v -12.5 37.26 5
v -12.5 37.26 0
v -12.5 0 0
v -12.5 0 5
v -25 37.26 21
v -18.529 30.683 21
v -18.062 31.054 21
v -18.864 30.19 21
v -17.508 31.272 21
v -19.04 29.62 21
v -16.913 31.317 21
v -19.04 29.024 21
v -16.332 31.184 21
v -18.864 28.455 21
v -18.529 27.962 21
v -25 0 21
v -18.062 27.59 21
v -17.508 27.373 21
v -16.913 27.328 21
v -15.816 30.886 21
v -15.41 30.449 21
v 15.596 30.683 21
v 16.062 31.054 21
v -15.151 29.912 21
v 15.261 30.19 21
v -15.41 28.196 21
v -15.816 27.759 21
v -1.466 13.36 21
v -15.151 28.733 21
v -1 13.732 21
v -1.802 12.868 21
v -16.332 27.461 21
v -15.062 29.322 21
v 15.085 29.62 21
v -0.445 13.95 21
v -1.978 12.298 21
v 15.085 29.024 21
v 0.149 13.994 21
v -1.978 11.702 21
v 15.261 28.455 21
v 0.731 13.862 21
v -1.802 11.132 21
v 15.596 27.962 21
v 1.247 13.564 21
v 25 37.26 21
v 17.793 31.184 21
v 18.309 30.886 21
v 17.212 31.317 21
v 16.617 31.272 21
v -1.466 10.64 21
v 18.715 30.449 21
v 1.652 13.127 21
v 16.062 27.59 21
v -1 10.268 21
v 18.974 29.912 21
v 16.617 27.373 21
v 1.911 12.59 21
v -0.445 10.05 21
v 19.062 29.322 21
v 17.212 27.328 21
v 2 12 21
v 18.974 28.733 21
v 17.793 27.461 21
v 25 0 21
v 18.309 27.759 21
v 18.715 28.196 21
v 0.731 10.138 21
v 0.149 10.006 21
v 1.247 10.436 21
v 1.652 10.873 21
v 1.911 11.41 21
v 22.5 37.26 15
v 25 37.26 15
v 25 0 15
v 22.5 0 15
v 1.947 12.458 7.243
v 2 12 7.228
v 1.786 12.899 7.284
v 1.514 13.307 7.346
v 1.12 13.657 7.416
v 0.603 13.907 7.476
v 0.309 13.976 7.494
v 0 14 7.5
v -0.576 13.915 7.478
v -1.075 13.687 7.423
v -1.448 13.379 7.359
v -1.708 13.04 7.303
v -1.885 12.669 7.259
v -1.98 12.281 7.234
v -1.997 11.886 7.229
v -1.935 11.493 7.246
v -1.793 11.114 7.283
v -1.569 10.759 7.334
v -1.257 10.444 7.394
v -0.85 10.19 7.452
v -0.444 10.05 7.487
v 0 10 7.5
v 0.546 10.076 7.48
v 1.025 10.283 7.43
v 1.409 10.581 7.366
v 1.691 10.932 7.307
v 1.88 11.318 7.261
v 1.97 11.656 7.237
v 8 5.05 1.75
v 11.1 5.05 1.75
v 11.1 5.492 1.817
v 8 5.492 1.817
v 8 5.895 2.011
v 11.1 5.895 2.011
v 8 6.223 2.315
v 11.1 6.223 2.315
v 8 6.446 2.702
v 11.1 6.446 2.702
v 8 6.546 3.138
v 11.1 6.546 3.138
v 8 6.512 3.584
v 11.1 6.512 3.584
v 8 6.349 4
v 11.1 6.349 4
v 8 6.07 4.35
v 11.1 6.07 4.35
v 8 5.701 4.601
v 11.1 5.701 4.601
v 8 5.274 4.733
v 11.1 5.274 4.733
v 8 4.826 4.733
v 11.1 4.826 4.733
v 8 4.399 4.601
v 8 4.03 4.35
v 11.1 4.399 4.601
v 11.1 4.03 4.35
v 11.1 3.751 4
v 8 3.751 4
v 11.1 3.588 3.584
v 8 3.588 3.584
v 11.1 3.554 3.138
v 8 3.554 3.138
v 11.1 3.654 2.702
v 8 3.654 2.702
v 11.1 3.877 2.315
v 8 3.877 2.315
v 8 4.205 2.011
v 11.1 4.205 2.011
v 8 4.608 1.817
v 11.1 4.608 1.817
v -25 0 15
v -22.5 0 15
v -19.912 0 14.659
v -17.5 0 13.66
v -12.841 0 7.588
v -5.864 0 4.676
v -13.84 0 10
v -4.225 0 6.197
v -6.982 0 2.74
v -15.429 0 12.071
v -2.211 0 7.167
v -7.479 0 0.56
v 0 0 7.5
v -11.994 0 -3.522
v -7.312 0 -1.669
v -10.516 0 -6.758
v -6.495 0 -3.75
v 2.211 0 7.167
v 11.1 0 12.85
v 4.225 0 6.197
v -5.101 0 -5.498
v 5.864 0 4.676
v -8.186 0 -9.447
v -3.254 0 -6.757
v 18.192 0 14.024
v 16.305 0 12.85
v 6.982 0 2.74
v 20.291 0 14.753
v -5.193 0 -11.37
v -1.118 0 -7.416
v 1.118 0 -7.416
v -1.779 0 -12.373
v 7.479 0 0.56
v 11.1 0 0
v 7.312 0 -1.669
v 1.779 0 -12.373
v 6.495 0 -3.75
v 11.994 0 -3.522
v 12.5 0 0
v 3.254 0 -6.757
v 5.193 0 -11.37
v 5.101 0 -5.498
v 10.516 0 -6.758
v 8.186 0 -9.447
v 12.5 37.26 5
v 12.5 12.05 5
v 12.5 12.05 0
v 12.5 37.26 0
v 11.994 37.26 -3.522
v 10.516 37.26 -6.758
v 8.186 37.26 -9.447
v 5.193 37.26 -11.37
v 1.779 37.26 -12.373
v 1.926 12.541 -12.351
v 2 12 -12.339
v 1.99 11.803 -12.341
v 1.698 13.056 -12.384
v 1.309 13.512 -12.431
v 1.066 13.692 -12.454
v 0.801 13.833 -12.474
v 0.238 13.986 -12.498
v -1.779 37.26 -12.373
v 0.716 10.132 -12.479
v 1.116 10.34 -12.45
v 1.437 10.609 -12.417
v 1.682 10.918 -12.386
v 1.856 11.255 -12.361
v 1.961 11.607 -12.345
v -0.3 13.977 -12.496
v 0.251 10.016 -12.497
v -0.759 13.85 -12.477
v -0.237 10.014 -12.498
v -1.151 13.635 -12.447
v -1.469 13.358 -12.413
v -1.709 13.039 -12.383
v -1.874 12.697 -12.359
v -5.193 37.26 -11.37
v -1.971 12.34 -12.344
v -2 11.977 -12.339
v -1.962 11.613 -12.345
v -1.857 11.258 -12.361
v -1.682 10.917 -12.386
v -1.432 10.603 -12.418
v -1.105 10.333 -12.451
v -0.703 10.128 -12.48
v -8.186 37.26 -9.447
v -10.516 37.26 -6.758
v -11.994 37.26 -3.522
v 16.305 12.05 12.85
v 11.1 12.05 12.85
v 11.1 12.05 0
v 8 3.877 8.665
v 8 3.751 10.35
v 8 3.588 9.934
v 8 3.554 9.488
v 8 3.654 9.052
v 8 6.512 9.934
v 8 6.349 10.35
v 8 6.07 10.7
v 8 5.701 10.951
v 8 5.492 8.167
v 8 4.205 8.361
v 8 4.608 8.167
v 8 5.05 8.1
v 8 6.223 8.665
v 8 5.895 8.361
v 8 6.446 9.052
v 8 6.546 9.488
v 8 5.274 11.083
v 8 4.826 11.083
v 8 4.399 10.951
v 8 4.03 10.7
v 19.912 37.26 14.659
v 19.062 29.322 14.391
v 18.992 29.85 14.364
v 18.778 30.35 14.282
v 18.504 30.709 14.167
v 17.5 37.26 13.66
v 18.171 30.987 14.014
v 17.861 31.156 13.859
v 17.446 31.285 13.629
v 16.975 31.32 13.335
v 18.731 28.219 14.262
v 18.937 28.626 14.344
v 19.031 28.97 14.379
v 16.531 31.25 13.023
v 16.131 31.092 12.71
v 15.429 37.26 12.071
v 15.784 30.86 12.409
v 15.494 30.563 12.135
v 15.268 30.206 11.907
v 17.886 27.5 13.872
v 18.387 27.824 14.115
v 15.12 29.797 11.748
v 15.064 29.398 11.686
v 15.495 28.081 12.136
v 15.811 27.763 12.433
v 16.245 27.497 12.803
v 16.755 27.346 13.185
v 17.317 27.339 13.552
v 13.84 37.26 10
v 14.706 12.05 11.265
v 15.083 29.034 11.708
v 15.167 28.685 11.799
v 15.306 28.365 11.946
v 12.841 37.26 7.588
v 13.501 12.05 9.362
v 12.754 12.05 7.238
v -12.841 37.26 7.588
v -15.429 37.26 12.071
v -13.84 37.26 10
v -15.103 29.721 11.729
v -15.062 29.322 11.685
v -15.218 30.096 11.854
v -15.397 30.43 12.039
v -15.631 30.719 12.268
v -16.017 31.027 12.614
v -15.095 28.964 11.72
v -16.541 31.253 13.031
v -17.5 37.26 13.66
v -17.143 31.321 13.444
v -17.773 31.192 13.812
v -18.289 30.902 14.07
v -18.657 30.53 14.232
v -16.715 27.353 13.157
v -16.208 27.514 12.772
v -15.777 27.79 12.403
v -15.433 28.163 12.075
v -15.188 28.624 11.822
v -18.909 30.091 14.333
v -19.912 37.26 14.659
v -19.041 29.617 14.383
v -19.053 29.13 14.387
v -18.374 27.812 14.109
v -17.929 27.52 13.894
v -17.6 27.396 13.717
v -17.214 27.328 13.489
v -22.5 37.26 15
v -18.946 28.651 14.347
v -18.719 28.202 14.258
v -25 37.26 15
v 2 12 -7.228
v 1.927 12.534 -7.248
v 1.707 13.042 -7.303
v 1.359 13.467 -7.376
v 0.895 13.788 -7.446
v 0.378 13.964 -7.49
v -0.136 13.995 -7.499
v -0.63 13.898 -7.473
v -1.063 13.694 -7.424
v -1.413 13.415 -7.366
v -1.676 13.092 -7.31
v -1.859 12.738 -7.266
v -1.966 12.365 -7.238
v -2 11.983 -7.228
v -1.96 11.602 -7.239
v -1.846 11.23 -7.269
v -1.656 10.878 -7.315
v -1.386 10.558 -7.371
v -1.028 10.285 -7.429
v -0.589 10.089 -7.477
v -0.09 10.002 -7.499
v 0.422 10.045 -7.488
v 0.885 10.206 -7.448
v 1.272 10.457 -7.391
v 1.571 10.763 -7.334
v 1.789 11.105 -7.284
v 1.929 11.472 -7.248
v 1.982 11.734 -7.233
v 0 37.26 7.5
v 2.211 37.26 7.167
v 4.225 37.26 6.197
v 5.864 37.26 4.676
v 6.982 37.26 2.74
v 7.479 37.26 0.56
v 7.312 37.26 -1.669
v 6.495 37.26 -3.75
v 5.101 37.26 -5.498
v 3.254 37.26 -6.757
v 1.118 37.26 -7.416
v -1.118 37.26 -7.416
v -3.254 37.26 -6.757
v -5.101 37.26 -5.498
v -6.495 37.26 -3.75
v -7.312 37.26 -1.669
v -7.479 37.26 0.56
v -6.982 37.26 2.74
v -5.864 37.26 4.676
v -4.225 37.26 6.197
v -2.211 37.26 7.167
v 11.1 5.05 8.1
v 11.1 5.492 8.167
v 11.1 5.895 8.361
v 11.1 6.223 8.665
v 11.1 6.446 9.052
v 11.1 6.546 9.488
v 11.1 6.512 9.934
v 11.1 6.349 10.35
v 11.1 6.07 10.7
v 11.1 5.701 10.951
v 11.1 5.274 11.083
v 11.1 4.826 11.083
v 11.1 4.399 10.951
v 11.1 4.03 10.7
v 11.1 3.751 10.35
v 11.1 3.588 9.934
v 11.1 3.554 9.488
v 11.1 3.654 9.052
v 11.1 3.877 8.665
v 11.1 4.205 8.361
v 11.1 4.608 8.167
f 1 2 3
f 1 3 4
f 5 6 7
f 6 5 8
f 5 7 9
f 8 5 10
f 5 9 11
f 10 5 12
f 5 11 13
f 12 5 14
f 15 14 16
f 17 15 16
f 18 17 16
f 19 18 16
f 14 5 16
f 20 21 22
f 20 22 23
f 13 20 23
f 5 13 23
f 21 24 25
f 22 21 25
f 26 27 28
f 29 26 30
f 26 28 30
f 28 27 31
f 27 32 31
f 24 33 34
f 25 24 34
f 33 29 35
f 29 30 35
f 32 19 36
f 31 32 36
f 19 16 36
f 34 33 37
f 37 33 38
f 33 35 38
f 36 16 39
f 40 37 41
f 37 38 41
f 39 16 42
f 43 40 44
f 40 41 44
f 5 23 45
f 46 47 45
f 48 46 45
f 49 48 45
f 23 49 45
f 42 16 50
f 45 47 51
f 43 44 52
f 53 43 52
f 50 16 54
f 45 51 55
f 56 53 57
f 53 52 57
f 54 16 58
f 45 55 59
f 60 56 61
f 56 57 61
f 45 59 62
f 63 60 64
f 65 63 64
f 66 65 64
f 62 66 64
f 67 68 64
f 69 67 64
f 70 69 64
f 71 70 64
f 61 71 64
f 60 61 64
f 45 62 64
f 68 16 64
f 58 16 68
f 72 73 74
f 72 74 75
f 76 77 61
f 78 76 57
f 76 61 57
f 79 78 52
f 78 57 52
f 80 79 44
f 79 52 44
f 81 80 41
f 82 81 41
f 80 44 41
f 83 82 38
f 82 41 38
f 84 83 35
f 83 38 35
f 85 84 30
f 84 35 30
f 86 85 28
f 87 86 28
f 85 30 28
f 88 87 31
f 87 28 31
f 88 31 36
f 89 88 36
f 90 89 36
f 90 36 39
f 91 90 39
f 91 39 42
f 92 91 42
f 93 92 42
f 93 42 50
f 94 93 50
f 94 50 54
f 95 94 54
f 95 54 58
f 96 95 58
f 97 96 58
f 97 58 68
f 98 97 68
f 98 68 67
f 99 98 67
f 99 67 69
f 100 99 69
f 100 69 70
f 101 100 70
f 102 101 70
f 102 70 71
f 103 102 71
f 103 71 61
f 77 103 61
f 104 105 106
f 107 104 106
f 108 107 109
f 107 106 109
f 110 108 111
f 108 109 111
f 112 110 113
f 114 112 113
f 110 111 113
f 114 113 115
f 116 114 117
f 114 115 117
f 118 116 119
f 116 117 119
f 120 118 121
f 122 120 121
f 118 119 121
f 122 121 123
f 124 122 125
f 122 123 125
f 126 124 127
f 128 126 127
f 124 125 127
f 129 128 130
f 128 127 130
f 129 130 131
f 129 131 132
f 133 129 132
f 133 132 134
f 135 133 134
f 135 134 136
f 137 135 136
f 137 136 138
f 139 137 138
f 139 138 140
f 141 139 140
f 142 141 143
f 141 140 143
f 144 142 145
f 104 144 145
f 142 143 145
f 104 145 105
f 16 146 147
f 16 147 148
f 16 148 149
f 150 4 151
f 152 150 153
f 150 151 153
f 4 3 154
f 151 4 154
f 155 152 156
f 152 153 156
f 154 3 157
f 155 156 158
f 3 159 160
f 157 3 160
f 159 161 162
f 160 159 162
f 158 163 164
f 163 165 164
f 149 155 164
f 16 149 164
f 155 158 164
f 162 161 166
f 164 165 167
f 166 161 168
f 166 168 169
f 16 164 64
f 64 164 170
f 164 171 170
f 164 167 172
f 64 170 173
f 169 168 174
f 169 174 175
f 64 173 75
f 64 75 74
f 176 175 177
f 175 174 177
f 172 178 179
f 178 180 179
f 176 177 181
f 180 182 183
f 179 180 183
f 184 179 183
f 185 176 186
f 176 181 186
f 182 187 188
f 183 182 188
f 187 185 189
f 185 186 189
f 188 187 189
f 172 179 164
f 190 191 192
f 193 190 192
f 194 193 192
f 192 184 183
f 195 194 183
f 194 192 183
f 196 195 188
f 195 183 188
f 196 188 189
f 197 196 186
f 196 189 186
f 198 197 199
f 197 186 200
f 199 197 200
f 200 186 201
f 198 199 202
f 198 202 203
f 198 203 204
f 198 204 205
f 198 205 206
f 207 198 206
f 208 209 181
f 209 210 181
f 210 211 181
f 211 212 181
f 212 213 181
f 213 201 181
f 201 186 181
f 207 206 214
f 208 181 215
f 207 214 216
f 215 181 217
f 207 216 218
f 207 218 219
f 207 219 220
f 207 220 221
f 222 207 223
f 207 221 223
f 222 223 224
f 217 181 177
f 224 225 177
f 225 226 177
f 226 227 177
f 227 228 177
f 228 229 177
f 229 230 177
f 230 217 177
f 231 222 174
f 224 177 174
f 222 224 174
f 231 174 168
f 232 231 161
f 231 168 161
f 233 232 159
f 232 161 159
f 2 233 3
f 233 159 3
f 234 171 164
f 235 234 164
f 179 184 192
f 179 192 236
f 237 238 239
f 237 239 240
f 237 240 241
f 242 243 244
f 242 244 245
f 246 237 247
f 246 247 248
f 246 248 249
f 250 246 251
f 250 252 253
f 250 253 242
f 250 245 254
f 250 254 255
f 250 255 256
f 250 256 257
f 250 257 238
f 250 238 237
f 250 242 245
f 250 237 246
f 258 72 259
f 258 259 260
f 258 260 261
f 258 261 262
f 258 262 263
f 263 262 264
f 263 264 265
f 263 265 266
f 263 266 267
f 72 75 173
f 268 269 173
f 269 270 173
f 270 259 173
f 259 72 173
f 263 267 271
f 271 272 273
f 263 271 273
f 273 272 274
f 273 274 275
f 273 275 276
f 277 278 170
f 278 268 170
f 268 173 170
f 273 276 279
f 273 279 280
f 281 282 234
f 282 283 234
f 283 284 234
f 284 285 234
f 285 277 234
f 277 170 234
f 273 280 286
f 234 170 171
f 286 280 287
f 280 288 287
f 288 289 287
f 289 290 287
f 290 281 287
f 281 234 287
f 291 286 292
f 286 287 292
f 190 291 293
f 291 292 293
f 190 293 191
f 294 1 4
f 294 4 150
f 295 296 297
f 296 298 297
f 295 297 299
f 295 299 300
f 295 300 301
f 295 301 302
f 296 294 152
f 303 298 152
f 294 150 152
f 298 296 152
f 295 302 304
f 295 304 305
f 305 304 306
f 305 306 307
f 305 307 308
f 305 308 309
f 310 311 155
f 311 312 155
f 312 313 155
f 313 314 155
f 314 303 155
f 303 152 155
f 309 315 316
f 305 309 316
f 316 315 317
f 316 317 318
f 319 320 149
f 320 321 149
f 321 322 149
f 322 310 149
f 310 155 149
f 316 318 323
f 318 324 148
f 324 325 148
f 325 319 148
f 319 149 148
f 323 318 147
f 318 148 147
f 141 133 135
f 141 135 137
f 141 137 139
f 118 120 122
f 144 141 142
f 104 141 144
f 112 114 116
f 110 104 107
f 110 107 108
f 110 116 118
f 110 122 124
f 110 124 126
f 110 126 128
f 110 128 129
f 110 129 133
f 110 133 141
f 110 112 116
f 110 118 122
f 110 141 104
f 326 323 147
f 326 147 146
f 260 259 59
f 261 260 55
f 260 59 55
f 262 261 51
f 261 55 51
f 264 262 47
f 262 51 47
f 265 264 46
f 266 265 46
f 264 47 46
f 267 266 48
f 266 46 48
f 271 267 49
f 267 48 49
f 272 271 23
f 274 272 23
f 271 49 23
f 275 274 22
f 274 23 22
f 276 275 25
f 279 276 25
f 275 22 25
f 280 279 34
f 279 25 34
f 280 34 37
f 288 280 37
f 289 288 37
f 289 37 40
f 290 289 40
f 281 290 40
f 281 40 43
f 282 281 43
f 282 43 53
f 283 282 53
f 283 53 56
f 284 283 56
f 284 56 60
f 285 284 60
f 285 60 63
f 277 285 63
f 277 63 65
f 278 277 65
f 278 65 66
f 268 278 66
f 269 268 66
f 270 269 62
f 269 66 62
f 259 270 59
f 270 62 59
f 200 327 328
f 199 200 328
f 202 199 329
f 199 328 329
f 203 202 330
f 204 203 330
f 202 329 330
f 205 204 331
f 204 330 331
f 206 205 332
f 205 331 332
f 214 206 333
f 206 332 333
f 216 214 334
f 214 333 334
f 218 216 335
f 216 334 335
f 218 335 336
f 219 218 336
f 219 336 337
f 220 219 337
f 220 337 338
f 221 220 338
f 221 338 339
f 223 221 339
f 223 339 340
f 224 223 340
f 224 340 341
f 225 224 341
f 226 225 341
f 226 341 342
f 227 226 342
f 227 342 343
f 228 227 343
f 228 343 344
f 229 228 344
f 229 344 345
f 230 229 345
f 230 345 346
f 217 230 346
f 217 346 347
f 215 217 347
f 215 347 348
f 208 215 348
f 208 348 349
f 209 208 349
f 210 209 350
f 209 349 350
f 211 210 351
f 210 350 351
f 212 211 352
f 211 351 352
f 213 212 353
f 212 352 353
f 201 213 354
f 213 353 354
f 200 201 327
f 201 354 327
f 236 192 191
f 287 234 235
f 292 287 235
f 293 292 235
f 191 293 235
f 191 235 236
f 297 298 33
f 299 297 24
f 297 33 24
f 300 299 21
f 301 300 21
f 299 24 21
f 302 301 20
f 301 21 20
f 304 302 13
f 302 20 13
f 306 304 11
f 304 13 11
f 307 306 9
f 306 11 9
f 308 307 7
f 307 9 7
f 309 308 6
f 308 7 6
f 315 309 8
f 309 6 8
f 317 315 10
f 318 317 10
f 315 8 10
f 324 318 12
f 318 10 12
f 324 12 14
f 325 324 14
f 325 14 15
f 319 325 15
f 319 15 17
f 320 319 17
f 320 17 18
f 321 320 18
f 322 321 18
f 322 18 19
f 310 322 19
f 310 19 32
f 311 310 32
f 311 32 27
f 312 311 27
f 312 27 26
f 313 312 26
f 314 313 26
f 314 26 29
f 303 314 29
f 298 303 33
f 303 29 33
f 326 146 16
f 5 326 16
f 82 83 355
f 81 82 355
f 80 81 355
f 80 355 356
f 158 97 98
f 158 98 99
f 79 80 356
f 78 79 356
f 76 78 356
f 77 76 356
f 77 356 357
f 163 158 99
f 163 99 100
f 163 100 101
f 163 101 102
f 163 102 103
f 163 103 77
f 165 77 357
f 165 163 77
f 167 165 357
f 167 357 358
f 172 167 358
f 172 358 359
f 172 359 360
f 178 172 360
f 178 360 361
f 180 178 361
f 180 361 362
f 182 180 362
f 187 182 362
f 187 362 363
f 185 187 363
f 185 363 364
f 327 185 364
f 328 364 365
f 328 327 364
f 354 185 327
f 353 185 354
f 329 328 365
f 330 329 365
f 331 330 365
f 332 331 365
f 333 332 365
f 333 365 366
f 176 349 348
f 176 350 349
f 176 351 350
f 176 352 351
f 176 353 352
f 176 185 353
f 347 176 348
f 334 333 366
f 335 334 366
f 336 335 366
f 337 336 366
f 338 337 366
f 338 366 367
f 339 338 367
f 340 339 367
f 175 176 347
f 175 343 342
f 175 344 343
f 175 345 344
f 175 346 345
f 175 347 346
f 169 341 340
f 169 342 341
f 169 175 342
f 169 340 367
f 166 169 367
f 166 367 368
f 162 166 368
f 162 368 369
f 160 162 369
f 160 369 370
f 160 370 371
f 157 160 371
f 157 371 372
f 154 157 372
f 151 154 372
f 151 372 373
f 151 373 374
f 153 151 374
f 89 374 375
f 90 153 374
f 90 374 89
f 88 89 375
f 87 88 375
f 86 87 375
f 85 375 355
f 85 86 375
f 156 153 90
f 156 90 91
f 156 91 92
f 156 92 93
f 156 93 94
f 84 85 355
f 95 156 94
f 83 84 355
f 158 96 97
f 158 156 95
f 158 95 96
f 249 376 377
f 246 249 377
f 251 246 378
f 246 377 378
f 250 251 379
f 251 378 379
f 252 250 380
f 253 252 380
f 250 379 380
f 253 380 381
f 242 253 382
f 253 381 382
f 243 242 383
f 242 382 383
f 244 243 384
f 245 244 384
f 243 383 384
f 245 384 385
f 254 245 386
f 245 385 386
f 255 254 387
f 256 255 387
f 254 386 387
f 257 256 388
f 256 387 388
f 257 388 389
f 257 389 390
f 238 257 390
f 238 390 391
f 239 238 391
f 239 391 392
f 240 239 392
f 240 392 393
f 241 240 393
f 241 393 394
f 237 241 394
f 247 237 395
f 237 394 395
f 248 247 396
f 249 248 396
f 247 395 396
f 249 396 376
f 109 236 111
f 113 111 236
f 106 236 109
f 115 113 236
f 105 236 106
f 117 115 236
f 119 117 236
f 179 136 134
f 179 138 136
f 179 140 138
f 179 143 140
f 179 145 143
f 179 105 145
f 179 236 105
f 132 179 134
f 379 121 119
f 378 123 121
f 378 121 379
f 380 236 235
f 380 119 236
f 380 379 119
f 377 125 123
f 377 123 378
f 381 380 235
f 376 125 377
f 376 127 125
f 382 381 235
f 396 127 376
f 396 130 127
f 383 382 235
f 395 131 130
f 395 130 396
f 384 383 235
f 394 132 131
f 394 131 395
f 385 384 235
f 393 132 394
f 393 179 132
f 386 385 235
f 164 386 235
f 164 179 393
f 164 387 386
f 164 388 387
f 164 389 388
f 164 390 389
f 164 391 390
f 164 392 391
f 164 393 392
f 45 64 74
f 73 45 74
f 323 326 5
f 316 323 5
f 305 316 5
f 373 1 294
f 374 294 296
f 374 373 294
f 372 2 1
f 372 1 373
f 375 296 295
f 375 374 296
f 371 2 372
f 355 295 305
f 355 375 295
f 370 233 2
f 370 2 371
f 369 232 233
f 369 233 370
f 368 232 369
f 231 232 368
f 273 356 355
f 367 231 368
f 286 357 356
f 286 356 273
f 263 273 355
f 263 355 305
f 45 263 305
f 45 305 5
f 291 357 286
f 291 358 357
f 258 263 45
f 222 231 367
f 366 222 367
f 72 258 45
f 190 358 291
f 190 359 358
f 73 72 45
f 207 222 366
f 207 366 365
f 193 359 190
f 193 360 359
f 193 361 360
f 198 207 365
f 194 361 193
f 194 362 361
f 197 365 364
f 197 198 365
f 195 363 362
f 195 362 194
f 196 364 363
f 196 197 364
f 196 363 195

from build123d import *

# Parameters (mm, degrees)
PROFILE_SKETCH1_R                         = 7.5
PROFILE_BOSS_EXTRUDE2_DEPTH               = 37.25987
FASTENINGHOLESKETCH3_R                    = 2
FASTENINGHOLECUT_EXTRUDE8_DEPTH           = 56.995963358
LM8UUFASTENINGHOLESKETCH5_R               = 2
LM8UUFASTENINGHOLECUT_EXTRUDE9_DEPTH      = 56.995963425
MICROSWITCHCUT_EXTRUDE1_DEPTH             = 12.05
MICROSWITCHMOUNTINGHOLESKETCH2_R          = 1.5
MICROSWITCHMOUNTINGHOLECUT_EXTRUDE2_DEPTH = 3.1


with BuildPart() as part:
    # Profile-Sketch1 → Profile-Boss-Extrude2 (new body)
    with BuildSketch(Plane(origin=(0, 0, 0), x_dir=(1, 0, 0), z_dir=(0, 1, 0))):
        with BuildLine():
            Line((-25, -21), (25, -21))
            Line((25, -21), (25, -15))
            Line((25, -15), (22.5, -15))
            ThreePointArc((22.5, -15), (15.428932188, -12.071067812), (12.5, -5))
            Line((12.5, -5), (12.5, 0))
            ThreePointArc((12.5, 0), (0, 12.5), (-12.5, 0))
            Line((-12.5, 0), (-12.5, -5))
            ThreePointArc((-12.5, -5), (-15.428932188, -12.071067812), (-22.5, -15))
            Line((-22.5, -15), (-25, -15))
            Line((-25, -15), (-25, -21))
        make_face()
        with Locations(Location((0, 0, 0), (0, 0, 270))):
            Circle(PROFILE_SKETCH1_R, mode=Mode.SUBTRACT)
    extrude(amount=PROFILE_BOSS_EXTRUDE2_DEPTH)

    # FasteningHoleSketch3 → FasteningHoleCut-Extrude8 (cut, through all)
    with BuildSketch(Plane.XY.offset(21)):
        with Locations((-17.0625, 29.32237)):
            Circle(FASTENINGHOLESKETCH3_R)
        with Locations((17.0625, 29.32237)):
            Circle(FASTENINGHOLESKETCH3_R)
    extrude(amount=-FASTENINGHOLECUT_EXTRUDE8_DEPTH, mode=Mode.SUBTRACT)

    # LM8UUFasteningHoleSketch5 → LM8UUFasteningHoleCut-Extrude9 (cut, through all)
    with BuildSketch(Plane.XY.offset(21)):
        with Locations((0, 12)):
            Circle(LM8UUFASTENINGHOLESKETCH5_R)
    extrude(amount=-LM8UUFASTENINGHOLECUT_EXTRUDE9_DEPTH, mode=Mode.SUBTRACT)

    # Sketch1 → MicroSwitchCut-Extrude1 (cut)
    with BuildSketch(Plane.XZ):
        Polygon((13.9, 12.85), (16.363847734, 12.85), (13.9, 10.102940329), (13.9, 0), (11.1, 0), (11.1, 12.85), align=None)
    extrude(amount=-MICROSWITCHCUT_EXTRUDE1_DEPTH, mode=Mode.SUBTRACT)

    # MicroSwitchMountingHoleSketch2 → MicroSwitchMountingHoleCut-Extrude2 (cut)
    with BuildSketch(Plane(origin=(11.1, 0, 0), x_dir=(0, 0, -1), z_dir=(1, 0, 0))):
        with Locations((-9.6, 5.05)):
            Circle(MICROSWITCHMOUNTINGHOLESKETCH2_R)
        with Locations((-3.25, 5.05)):
            Circle(MICROSWITCHMOUNTINGHOLESKETCH2_R)
    extrude(amount=-MICROSWITCHMOUNTINGHOLECUT_EXTRUDE2_DEPTH, mode=Mode.SUBTRACT)


solid = part.part
